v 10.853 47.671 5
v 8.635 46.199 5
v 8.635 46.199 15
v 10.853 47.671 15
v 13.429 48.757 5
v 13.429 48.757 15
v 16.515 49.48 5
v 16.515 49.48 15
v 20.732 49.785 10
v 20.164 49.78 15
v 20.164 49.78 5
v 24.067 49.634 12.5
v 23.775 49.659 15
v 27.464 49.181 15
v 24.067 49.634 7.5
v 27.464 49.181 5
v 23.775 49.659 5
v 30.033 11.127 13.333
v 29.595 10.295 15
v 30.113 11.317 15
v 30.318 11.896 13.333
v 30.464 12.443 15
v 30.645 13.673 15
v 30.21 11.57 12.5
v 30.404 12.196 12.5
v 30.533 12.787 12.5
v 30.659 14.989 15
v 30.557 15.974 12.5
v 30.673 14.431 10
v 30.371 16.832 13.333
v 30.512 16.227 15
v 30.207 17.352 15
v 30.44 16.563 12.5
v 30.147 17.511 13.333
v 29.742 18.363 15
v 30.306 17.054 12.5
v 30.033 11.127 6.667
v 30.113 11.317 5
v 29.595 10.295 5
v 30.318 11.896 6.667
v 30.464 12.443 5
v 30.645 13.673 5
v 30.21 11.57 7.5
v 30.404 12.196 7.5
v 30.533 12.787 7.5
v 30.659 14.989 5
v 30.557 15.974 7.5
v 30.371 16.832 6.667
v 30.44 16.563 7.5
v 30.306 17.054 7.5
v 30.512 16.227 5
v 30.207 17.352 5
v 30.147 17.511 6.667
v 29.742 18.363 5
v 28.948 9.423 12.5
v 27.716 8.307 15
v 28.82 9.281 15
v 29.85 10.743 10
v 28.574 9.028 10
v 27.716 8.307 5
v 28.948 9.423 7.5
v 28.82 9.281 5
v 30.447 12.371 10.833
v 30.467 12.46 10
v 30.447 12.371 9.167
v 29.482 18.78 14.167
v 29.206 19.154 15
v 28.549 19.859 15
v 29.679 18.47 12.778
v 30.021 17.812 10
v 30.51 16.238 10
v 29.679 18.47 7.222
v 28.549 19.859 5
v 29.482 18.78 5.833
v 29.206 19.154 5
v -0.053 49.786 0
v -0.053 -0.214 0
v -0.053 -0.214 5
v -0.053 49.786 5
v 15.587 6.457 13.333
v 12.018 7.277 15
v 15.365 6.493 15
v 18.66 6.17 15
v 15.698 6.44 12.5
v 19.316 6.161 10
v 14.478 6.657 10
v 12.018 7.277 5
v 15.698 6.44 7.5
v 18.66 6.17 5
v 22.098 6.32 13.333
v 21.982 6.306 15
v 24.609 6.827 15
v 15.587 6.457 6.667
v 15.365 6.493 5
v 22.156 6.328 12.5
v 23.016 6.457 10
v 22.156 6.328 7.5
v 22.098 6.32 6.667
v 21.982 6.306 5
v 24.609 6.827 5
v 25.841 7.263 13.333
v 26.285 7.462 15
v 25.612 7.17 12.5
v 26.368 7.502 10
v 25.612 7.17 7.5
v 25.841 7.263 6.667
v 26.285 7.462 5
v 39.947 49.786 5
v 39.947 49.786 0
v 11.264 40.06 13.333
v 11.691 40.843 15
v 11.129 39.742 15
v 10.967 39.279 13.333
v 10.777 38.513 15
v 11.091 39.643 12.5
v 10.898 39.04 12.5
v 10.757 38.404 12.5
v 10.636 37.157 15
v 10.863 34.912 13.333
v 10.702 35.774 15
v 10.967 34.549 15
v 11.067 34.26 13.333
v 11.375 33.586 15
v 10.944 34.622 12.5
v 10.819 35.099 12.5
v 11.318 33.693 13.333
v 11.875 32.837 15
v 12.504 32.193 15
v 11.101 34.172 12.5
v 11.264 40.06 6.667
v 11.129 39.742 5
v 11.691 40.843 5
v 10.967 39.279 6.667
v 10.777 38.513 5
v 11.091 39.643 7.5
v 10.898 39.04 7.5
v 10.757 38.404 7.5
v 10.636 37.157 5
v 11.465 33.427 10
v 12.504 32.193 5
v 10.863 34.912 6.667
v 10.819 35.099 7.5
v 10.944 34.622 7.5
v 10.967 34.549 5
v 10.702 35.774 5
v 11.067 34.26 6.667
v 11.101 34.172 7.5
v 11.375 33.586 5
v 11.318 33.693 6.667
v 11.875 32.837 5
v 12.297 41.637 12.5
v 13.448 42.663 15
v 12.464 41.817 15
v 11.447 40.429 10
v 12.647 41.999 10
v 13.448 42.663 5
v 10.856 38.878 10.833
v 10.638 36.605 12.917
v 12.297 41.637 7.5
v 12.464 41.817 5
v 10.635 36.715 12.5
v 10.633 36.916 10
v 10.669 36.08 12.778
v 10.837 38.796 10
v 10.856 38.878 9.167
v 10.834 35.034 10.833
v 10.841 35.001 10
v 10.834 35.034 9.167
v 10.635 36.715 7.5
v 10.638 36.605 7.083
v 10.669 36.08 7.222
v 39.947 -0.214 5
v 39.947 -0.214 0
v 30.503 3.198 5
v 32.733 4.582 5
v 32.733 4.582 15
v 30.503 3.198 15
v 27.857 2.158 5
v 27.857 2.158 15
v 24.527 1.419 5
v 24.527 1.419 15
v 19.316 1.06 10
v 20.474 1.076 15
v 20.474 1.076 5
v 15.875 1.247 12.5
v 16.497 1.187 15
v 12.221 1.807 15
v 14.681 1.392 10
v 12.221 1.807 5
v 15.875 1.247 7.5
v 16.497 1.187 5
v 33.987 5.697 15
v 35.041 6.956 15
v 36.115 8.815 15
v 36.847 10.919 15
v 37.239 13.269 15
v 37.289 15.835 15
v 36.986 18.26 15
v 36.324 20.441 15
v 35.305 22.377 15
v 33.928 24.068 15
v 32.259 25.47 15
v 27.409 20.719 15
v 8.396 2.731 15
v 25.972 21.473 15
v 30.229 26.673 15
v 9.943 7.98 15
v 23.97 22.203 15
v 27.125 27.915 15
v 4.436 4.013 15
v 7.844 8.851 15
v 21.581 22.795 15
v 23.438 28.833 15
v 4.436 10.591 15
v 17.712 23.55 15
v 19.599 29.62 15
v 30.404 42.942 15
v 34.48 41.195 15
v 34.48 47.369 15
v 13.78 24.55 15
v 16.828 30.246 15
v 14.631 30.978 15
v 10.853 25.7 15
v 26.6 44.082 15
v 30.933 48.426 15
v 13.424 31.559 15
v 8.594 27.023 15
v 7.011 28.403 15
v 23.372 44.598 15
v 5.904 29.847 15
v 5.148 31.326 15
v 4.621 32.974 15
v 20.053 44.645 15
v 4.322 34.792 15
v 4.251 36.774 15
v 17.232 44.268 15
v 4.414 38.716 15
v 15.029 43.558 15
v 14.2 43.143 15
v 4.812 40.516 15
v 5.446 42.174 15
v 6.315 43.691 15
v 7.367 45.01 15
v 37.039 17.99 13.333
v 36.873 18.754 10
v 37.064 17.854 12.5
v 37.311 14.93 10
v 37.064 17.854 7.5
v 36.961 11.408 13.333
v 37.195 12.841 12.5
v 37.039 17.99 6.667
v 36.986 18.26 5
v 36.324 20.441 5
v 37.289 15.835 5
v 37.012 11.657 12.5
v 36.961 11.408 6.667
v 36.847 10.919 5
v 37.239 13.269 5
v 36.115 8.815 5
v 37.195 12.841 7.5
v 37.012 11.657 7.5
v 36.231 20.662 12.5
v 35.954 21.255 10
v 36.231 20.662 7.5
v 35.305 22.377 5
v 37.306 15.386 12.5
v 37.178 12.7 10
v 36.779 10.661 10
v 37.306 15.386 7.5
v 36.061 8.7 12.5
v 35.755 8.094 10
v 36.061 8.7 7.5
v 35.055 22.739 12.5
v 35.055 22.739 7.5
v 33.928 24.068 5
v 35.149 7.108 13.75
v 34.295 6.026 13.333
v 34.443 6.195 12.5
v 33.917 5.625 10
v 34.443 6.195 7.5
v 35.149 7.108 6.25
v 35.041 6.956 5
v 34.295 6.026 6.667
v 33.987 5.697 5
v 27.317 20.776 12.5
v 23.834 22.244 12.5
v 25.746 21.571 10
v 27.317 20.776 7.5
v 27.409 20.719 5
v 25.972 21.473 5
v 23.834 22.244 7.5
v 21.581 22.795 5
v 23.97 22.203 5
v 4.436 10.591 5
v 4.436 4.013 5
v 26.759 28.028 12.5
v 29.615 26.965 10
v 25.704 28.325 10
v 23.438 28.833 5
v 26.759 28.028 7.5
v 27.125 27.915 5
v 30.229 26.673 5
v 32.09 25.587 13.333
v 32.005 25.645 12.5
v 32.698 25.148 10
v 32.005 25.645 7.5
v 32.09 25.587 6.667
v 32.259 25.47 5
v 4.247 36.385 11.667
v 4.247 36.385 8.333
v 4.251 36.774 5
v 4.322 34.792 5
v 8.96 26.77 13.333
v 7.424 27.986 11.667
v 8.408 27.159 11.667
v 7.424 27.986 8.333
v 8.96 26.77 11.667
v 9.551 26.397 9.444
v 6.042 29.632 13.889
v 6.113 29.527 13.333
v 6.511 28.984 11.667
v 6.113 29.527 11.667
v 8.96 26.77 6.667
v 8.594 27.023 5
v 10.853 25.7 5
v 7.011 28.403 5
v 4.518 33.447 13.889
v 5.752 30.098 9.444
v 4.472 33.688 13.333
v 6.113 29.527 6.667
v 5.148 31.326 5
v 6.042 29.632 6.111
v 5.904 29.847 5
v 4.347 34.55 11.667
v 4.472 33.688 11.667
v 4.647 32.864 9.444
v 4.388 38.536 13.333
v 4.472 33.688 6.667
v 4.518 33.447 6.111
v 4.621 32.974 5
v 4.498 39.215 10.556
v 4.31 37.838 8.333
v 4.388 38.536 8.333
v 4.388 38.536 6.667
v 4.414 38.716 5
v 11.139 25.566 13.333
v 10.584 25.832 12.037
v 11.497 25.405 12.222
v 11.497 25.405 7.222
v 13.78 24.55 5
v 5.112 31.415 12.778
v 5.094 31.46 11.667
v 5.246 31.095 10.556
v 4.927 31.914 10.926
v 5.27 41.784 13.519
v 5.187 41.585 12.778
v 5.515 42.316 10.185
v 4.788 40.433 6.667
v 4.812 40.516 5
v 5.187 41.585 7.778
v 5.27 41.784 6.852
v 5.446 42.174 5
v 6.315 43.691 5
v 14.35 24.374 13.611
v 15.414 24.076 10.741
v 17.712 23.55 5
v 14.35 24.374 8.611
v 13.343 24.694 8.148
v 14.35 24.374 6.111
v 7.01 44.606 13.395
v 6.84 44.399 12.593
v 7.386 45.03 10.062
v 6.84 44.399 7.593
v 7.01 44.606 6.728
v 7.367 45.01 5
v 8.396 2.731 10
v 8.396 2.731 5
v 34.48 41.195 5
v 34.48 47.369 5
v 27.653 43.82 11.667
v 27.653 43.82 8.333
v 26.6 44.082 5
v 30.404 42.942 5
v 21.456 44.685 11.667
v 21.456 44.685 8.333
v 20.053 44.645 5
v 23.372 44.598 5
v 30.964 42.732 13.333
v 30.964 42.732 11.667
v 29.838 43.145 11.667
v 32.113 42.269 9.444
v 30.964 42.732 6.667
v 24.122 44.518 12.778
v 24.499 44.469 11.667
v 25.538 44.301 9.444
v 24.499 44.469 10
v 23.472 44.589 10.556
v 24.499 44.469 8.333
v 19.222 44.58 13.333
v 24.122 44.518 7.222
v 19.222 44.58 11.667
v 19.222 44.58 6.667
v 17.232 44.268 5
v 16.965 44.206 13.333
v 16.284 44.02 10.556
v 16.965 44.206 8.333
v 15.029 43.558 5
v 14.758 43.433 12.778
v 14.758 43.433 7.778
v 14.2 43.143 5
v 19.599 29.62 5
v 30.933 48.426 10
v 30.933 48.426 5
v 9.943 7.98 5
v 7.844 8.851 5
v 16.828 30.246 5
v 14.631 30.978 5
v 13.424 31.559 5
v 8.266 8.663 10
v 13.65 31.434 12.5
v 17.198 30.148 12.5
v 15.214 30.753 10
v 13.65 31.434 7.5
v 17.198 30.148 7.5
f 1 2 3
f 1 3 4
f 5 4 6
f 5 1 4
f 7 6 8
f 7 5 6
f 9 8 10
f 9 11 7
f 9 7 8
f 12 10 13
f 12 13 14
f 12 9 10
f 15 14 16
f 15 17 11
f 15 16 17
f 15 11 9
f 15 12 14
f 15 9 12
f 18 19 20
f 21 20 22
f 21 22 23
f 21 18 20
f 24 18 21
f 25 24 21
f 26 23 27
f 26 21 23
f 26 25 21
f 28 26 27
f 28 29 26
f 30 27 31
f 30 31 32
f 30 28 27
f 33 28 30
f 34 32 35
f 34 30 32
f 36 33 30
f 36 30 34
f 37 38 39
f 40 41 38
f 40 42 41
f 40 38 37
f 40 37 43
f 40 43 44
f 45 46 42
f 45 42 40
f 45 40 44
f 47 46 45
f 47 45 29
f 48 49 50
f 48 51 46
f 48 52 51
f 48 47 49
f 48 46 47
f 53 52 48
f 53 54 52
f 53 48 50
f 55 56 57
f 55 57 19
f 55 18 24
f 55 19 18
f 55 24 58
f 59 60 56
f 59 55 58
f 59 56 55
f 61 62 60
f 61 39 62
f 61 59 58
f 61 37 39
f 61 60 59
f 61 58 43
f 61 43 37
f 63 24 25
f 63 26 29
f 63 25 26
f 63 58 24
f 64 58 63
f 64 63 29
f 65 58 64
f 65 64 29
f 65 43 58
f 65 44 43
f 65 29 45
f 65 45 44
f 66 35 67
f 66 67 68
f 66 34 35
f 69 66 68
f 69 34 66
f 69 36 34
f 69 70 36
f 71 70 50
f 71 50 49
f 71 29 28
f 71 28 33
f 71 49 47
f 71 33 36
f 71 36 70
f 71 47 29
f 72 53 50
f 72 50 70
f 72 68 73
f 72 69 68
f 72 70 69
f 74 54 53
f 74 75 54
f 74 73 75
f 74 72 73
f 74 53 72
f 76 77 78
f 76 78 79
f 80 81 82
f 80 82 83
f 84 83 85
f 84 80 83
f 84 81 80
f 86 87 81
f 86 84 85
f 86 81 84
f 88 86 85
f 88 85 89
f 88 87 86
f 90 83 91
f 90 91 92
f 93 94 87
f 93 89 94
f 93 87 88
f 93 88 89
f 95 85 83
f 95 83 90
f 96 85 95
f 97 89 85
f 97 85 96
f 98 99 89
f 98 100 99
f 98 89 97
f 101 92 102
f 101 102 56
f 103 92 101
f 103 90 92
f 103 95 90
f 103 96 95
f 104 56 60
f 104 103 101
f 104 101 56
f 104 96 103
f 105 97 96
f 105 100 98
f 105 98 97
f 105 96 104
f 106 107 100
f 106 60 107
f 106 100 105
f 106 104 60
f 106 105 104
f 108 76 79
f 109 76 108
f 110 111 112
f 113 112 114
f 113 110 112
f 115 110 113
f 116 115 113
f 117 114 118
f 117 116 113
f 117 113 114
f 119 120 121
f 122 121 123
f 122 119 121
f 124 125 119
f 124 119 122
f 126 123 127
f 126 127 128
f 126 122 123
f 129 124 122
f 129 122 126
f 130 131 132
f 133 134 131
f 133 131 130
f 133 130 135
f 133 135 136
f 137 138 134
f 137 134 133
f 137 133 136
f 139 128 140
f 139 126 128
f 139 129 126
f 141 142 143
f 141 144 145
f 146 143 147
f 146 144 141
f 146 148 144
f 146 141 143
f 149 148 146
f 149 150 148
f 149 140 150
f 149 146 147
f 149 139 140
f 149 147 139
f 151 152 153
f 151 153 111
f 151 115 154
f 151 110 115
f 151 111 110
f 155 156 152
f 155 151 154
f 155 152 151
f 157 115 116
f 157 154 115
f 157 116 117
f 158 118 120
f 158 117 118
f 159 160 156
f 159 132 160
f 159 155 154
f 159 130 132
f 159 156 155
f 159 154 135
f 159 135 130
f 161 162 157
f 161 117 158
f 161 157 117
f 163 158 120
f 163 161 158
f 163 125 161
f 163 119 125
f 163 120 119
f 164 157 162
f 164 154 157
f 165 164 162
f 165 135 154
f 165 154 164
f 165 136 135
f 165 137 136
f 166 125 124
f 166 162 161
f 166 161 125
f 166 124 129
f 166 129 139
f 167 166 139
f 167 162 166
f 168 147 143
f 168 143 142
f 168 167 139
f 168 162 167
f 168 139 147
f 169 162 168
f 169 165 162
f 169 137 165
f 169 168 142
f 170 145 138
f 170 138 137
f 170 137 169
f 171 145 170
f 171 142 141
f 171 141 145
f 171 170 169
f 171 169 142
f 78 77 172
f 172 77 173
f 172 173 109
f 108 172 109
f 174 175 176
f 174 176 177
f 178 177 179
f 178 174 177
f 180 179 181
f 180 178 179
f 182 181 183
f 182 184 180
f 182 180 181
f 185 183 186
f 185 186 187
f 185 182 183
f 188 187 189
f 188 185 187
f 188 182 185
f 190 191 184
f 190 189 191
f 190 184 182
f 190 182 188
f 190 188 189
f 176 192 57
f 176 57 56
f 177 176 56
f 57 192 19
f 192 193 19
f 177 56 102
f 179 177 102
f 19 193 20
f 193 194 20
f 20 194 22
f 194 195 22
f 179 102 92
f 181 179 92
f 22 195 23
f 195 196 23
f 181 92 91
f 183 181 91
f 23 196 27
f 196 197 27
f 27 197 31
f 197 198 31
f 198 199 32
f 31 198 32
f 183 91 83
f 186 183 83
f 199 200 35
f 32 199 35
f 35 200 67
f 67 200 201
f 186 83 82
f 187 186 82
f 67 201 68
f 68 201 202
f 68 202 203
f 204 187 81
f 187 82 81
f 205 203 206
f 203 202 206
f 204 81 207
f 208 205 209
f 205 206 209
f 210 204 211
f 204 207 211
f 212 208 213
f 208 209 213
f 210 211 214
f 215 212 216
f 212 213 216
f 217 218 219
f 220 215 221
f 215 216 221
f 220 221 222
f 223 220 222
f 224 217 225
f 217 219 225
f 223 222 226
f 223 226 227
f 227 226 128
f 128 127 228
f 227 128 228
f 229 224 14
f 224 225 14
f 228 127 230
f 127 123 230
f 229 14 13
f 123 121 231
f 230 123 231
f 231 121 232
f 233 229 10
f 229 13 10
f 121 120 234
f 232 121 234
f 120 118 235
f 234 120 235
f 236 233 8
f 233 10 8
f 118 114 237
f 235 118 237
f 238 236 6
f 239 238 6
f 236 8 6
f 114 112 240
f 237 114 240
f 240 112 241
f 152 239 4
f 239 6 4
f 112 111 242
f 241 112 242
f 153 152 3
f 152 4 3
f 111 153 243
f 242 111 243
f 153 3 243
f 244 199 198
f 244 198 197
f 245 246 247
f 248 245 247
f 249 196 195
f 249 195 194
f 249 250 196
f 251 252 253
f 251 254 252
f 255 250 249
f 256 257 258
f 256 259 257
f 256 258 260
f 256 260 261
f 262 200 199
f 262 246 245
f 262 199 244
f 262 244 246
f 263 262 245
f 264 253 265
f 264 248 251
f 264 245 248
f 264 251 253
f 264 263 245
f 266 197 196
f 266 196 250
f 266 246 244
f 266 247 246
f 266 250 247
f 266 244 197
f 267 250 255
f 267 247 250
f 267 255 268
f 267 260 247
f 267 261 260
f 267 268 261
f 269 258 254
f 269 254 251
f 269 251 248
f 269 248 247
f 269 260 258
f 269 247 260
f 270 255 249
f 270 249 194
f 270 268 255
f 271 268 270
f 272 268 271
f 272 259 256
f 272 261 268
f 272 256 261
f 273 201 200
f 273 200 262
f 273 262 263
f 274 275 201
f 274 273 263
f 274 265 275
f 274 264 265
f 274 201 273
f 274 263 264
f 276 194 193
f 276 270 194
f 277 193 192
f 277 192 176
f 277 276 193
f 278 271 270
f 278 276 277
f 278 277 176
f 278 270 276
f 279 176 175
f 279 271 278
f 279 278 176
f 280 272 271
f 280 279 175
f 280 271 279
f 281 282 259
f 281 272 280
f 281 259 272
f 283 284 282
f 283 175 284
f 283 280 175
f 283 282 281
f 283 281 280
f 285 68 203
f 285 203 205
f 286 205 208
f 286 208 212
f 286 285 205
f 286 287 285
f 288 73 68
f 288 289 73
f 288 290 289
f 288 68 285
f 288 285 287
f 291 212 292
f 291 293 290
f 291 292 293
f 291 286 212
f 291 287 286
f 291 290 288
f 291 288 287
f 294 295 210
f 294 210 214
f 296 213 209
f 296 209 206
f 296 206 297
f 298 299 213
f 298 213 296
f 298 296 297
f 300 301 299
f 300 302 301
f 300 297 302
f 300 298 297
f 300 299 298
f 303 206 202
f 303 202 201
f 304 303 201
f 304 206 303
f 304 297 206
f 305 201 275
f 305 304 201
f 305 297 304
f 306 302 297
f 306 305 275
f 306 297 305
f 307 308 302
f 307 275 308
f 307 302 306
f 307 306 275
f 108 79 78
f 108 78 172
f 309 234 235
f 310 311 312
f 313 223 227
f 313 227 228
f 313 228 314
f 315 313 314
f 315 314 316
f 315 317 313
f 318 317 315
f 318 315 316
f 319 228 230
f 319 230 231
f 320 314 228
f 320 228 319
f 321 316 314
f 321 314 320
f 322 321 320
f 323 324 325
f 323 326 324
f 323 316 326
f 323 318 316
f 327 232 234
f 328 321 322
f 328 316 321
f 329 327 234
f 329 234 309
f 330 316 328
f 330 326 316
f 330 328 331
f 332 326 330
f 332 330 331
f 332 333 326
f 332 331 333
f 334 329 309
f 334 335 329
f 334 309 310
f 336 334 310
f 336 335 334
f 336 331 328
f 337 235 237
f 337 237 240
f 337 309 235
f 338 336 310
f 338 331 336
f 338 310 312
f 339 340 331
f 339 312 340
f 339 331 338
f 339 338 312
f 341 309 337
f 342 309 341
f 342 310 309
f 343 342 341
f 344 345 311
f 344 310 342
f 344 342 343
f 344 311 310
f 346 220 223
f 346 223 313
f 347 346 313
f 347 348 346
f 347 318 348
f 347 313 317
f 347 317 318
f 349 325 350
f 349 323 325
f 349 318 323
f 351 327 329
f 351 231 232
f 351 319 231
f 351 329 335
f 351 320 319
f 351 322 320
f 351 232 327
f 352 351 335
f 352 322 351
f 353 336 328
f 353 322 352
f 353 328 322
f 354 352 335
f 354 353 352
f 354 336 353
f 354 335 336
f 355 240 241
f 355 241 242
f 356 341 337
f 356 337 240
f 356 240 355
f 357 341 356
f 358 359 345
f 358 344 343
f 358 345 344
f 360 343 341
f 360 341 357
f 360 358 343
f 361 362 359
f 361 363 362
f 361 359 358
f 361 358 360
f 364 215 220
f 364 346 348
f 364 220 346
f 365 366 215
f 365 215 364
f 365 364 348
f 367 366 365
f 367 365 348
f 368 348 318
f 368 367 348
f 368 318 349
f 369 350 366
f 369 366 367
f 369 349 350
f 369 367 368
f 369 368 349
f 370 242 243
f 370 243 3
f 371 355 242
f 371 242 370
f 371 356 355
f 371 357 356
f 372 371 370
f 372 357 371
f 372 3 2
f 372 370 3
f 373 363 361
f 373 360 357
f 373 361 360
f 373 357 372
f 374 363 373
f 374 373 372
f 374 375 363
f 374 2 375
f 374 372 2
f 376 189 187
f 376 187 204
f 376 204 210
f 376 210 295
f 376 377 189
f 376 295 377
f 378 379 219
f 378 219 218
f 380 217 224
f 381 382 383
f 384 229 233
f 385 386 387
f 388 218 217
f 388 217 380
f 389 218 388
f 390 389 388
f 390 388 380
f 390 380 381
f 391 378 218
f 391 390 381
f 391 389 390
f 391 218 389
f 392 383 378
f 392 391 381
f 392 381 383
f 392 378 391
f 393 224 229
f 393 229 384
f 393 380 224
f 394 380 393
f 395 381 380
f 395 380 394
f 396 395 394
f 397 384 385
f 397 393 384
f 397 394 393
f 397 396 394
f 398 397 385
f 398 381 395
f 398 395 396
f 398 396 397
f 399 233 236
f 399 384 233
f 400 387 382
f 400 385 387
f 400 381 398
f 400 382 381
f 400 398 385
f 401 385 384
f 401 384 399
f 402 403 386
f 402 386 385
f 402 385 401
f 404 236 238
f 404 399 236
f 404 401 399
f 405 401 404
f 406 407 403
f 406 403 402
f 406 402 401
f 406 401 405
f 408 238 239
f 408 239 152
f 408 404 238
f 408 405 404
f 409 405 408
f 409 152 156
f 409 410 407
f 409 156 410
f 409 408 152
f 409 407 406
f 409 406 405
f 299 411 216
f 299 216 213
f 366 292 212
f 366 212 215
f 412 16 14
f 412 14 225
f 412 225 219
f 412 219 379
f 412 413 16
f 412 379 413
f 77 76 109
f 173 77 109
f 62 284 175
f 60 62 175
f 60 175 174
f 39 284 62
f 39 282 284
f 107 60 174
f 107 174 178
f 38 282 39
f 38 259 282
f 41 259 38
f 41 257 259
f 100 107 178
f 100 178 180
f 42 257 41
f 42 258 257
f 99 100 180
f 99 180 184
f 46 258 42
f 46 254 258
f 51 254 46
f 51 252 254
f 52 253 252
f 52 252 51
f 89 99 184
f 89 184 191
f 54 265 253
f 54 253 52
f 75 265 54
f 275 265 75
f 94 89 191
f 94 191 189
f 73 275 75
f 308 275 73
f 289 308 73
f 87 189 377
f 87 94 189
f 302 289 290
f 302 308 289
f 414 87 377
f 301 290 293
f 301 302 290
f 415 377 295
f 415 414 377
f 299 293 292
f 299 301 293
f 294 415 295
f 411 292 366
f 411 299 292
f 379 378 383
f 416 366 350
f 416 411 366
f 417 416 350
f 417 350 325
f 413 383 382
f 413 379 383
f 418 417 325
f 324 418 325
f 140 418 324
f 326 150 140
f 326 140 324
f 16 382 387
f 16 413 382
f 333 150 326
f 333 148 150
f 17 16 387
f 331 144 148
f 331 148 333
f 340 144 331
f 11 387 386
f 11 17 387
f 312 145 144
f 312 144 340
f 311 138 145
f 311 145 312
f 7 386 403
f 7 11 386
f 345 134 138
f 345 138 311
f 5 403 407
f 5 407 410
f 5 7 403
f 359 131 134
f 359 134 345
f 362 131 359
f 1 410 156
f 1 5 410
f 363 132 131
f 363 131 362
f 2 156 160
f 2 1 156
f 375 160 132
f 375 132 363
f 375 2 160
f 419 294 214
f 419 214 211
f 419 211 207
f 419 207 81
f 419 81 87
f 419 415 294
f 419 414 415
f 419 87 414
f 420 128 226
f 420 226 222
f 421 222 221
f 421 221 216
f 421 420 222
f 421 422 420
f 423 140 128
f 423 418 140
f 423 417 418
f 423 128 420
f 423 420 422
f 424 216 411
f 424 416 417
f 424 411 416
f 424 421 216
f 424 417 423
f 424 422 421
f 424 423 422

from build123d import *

# Parameters (mm, degrees)
RECTANGLE_W     = 40
RECTANGLE_H     = 50
EXTRUSION_DEPTH = 5
PAD_DEPTH       = 10


with BuildPart() as extrusion:
    # Rectangle → Extrusion (new body)
    with BuildSketch(Plane(origin=(-0.053421, -0.213677, 0), x_dir=(1, 0, 0), z_dir=(0, 0, 1))):
        with Locations((20, 25)):
            Rectangle(RECTANGLE_W, RECTANGLE_H)
    extrude(amount=EXTRUSION_DEPTH)


with BuildPart() as body:
    # Sketch → Pad (new body)
    with BuildSketch(Plane.XY.offset(5)):
        with BuildLine():
            Line((34.479866, 47.369128), (34.479866, 41.194631))
            add(Edge.make_bspline(
                [(34.479866, 41.194631), (30.861997, 42.956376), (27.653104, 43.82047)],
                knots=[0, 0, 0, 1, 1, 1], degree=2))
            add(Edge.make_bspline(
                [(27.653104, 43.82047), (24.444211, 44.684564), (21.455537, 44.684564)],
                knots=[0, 0, 0, 1, 1, 1], degree=2))
            add(Edge.make_bspline(
                [(21.455537, 44.684564), (16.264681, 44.684564), (13.447987, 42.662752)],
                knots=[0, 0, 0, 1, 1, 1], degree=2))
            add(Edge.make_bspline(
                [(13.447987, 42.662752), (10.633389, 40.64094), (10.633389, 36.916107)],
                knots=[0, 0, 0, 1, 1, 1], degree=2))
            add(Edge.make_bspline(
                [(10.633389, 36.916107), (10.633389, 33.78901), (12.504195, 32.192953)],
                knots=[0, 0, 0, 1, 1, 1], degree=2))
            add(Edge.make_bspline(
                [(12.504195, 32.192953), (14.377097, 30.598993), (19.599413, 29.619547)],
                knots=[0, 0, 0, 1, 1, 1], degree=2))
            Line((19.599413, 29.619547), (23.4375, 28.833054))
            add(Edge.make_bspline(
                [(23.4375, 28.833054), (30.547399, 27.480285), (33.928272, 24.067953)],
                knots=[0, 0, 0, 1, 1, 1], degree=2))
            add(Edge.make_bspline(
                [(33.928272, 24.067953), (37.311242, 20.655621), (37.311242, 14.92995)],
                knots=[0, 0, 0, 1, 1, 1], degree=2))
            add(Edge.make_bspline(
                [(37.311242, 14.92995), (37.311242, 8.105285), (32.732802, 4.581795)],
                knots=[0, 0, 0, 1, 1, 1], degree=2))
            add(Edge.make_bspline(
                [(32.732802, 4.581795), (28.15646, 1.060403), (19.316275, 1.060403)],
                knots=[0, 0, 0, 1, 1, 1], degree=2))
            add(Edge.make_bspline(
                [(19.316275, 1.060403), (15.981544, 1.060403), (12.221057, 1.807047)],
                knots=[0, 0, 0, 1, 1, 1], degree=2))
            add(Edge.make_bspline(
                [(12.221057, 1.807047), (8.462668, 2.551594), (4.435822, 4.013423)],
                knots=[0, 0, 0, 1, 1, 1], degree=2))
            Line((4.435822, 4.013423), (4.435822, 10.590604))
            add(Edge.make_bspline(
                [(4.435822, 10.590604), (8.305369, 8.392617), (12.017617, 7.276846)],
                knots=[0, 0, 0, 1, 1, 1], degree=2))
            add(Edge.make_bspline(
                [(12.017617, 7.276846), (15.729866, 6.161074), (19.316275, 6.161074)],
                knots=[0, 0, 0, 1, 1, 1], degree=2))
            add(Edge.make_bspline(
                [(19.316275, 6.161074), (24.758809, 6.161074), (27.716023, 8.306628)],
                knots=[0, 0, 0, 1, 1, 1], degree=2))
            add(Edge.make_bspline(
                [(27.716023, 8.306628), (30.673238, 10.454279), (30.673238, 14.430789)],
                knots=[0, 0, 0, 1, 1, 1], degree=2))
            add(Edge.make_bspline(
                [(30.673238, 14.430789), (30.673238, 17.901846), (28.548658, 19.858641)],
                knots=[0, 0, 0, 1, 1, 1], degree=2))
            add(Edge.make_bspline(
                [(28.548658, 19.858641), (26.426174, 21.815436), (21.581376, 22.794883)],
                knots=[0, 0, 0, 1, 1, 1], degree=2))
            Line((21.581376, 22.794883), (17.711829, 23.549916))
            add(Edge.make_bspline(
                [(17.711829, 23.549916), (10.60193, 24.965604), (7.424497, 27.985738)],
                knots=[0, 0, 0, 1, 1, 1], degree=2))
            add(Edge.make_bspline(
                [(7.424497, 27.985738), (4.247064, 31.005872), (4.247064, 36.385487)],
                knots=[0, 0, 0, 1, 1, 1], degree=2))
            add(Edge.make_bspline(
                [(4.247064, 36.385487), (4.247064, 42.612416), (8.634648, 46.198826)],
                knots=[0, 0, 0, 1, 1, 1], degree=2))
            add(Edge.make_bspline(
                [(8.634648, 46.198826), (13.024329, 49.785235), (20.731963, 49.785235)],
                knots=[0, 0, 0, 1, 1, 1], degree=2))
            add(Edge.make_bspline(
                [(20.731963, 49.785235), (24.035235, 49.785235), (27.464346, 49.181208)],
                knots=[0, 0, 0, 1, 1, 1], degree=2))
            add(Edge.make_bspline(
                [(27.464346, 49.181208), (30.893456, 48.577181), (34.479866, 47.369128)],
                knots=[0, 0, 0, 1, 1, 1], degree=2))
        make_face()
    extrude(amount=PAD_DEPTH)


solid = Compound([extrusion.part, body.part])
